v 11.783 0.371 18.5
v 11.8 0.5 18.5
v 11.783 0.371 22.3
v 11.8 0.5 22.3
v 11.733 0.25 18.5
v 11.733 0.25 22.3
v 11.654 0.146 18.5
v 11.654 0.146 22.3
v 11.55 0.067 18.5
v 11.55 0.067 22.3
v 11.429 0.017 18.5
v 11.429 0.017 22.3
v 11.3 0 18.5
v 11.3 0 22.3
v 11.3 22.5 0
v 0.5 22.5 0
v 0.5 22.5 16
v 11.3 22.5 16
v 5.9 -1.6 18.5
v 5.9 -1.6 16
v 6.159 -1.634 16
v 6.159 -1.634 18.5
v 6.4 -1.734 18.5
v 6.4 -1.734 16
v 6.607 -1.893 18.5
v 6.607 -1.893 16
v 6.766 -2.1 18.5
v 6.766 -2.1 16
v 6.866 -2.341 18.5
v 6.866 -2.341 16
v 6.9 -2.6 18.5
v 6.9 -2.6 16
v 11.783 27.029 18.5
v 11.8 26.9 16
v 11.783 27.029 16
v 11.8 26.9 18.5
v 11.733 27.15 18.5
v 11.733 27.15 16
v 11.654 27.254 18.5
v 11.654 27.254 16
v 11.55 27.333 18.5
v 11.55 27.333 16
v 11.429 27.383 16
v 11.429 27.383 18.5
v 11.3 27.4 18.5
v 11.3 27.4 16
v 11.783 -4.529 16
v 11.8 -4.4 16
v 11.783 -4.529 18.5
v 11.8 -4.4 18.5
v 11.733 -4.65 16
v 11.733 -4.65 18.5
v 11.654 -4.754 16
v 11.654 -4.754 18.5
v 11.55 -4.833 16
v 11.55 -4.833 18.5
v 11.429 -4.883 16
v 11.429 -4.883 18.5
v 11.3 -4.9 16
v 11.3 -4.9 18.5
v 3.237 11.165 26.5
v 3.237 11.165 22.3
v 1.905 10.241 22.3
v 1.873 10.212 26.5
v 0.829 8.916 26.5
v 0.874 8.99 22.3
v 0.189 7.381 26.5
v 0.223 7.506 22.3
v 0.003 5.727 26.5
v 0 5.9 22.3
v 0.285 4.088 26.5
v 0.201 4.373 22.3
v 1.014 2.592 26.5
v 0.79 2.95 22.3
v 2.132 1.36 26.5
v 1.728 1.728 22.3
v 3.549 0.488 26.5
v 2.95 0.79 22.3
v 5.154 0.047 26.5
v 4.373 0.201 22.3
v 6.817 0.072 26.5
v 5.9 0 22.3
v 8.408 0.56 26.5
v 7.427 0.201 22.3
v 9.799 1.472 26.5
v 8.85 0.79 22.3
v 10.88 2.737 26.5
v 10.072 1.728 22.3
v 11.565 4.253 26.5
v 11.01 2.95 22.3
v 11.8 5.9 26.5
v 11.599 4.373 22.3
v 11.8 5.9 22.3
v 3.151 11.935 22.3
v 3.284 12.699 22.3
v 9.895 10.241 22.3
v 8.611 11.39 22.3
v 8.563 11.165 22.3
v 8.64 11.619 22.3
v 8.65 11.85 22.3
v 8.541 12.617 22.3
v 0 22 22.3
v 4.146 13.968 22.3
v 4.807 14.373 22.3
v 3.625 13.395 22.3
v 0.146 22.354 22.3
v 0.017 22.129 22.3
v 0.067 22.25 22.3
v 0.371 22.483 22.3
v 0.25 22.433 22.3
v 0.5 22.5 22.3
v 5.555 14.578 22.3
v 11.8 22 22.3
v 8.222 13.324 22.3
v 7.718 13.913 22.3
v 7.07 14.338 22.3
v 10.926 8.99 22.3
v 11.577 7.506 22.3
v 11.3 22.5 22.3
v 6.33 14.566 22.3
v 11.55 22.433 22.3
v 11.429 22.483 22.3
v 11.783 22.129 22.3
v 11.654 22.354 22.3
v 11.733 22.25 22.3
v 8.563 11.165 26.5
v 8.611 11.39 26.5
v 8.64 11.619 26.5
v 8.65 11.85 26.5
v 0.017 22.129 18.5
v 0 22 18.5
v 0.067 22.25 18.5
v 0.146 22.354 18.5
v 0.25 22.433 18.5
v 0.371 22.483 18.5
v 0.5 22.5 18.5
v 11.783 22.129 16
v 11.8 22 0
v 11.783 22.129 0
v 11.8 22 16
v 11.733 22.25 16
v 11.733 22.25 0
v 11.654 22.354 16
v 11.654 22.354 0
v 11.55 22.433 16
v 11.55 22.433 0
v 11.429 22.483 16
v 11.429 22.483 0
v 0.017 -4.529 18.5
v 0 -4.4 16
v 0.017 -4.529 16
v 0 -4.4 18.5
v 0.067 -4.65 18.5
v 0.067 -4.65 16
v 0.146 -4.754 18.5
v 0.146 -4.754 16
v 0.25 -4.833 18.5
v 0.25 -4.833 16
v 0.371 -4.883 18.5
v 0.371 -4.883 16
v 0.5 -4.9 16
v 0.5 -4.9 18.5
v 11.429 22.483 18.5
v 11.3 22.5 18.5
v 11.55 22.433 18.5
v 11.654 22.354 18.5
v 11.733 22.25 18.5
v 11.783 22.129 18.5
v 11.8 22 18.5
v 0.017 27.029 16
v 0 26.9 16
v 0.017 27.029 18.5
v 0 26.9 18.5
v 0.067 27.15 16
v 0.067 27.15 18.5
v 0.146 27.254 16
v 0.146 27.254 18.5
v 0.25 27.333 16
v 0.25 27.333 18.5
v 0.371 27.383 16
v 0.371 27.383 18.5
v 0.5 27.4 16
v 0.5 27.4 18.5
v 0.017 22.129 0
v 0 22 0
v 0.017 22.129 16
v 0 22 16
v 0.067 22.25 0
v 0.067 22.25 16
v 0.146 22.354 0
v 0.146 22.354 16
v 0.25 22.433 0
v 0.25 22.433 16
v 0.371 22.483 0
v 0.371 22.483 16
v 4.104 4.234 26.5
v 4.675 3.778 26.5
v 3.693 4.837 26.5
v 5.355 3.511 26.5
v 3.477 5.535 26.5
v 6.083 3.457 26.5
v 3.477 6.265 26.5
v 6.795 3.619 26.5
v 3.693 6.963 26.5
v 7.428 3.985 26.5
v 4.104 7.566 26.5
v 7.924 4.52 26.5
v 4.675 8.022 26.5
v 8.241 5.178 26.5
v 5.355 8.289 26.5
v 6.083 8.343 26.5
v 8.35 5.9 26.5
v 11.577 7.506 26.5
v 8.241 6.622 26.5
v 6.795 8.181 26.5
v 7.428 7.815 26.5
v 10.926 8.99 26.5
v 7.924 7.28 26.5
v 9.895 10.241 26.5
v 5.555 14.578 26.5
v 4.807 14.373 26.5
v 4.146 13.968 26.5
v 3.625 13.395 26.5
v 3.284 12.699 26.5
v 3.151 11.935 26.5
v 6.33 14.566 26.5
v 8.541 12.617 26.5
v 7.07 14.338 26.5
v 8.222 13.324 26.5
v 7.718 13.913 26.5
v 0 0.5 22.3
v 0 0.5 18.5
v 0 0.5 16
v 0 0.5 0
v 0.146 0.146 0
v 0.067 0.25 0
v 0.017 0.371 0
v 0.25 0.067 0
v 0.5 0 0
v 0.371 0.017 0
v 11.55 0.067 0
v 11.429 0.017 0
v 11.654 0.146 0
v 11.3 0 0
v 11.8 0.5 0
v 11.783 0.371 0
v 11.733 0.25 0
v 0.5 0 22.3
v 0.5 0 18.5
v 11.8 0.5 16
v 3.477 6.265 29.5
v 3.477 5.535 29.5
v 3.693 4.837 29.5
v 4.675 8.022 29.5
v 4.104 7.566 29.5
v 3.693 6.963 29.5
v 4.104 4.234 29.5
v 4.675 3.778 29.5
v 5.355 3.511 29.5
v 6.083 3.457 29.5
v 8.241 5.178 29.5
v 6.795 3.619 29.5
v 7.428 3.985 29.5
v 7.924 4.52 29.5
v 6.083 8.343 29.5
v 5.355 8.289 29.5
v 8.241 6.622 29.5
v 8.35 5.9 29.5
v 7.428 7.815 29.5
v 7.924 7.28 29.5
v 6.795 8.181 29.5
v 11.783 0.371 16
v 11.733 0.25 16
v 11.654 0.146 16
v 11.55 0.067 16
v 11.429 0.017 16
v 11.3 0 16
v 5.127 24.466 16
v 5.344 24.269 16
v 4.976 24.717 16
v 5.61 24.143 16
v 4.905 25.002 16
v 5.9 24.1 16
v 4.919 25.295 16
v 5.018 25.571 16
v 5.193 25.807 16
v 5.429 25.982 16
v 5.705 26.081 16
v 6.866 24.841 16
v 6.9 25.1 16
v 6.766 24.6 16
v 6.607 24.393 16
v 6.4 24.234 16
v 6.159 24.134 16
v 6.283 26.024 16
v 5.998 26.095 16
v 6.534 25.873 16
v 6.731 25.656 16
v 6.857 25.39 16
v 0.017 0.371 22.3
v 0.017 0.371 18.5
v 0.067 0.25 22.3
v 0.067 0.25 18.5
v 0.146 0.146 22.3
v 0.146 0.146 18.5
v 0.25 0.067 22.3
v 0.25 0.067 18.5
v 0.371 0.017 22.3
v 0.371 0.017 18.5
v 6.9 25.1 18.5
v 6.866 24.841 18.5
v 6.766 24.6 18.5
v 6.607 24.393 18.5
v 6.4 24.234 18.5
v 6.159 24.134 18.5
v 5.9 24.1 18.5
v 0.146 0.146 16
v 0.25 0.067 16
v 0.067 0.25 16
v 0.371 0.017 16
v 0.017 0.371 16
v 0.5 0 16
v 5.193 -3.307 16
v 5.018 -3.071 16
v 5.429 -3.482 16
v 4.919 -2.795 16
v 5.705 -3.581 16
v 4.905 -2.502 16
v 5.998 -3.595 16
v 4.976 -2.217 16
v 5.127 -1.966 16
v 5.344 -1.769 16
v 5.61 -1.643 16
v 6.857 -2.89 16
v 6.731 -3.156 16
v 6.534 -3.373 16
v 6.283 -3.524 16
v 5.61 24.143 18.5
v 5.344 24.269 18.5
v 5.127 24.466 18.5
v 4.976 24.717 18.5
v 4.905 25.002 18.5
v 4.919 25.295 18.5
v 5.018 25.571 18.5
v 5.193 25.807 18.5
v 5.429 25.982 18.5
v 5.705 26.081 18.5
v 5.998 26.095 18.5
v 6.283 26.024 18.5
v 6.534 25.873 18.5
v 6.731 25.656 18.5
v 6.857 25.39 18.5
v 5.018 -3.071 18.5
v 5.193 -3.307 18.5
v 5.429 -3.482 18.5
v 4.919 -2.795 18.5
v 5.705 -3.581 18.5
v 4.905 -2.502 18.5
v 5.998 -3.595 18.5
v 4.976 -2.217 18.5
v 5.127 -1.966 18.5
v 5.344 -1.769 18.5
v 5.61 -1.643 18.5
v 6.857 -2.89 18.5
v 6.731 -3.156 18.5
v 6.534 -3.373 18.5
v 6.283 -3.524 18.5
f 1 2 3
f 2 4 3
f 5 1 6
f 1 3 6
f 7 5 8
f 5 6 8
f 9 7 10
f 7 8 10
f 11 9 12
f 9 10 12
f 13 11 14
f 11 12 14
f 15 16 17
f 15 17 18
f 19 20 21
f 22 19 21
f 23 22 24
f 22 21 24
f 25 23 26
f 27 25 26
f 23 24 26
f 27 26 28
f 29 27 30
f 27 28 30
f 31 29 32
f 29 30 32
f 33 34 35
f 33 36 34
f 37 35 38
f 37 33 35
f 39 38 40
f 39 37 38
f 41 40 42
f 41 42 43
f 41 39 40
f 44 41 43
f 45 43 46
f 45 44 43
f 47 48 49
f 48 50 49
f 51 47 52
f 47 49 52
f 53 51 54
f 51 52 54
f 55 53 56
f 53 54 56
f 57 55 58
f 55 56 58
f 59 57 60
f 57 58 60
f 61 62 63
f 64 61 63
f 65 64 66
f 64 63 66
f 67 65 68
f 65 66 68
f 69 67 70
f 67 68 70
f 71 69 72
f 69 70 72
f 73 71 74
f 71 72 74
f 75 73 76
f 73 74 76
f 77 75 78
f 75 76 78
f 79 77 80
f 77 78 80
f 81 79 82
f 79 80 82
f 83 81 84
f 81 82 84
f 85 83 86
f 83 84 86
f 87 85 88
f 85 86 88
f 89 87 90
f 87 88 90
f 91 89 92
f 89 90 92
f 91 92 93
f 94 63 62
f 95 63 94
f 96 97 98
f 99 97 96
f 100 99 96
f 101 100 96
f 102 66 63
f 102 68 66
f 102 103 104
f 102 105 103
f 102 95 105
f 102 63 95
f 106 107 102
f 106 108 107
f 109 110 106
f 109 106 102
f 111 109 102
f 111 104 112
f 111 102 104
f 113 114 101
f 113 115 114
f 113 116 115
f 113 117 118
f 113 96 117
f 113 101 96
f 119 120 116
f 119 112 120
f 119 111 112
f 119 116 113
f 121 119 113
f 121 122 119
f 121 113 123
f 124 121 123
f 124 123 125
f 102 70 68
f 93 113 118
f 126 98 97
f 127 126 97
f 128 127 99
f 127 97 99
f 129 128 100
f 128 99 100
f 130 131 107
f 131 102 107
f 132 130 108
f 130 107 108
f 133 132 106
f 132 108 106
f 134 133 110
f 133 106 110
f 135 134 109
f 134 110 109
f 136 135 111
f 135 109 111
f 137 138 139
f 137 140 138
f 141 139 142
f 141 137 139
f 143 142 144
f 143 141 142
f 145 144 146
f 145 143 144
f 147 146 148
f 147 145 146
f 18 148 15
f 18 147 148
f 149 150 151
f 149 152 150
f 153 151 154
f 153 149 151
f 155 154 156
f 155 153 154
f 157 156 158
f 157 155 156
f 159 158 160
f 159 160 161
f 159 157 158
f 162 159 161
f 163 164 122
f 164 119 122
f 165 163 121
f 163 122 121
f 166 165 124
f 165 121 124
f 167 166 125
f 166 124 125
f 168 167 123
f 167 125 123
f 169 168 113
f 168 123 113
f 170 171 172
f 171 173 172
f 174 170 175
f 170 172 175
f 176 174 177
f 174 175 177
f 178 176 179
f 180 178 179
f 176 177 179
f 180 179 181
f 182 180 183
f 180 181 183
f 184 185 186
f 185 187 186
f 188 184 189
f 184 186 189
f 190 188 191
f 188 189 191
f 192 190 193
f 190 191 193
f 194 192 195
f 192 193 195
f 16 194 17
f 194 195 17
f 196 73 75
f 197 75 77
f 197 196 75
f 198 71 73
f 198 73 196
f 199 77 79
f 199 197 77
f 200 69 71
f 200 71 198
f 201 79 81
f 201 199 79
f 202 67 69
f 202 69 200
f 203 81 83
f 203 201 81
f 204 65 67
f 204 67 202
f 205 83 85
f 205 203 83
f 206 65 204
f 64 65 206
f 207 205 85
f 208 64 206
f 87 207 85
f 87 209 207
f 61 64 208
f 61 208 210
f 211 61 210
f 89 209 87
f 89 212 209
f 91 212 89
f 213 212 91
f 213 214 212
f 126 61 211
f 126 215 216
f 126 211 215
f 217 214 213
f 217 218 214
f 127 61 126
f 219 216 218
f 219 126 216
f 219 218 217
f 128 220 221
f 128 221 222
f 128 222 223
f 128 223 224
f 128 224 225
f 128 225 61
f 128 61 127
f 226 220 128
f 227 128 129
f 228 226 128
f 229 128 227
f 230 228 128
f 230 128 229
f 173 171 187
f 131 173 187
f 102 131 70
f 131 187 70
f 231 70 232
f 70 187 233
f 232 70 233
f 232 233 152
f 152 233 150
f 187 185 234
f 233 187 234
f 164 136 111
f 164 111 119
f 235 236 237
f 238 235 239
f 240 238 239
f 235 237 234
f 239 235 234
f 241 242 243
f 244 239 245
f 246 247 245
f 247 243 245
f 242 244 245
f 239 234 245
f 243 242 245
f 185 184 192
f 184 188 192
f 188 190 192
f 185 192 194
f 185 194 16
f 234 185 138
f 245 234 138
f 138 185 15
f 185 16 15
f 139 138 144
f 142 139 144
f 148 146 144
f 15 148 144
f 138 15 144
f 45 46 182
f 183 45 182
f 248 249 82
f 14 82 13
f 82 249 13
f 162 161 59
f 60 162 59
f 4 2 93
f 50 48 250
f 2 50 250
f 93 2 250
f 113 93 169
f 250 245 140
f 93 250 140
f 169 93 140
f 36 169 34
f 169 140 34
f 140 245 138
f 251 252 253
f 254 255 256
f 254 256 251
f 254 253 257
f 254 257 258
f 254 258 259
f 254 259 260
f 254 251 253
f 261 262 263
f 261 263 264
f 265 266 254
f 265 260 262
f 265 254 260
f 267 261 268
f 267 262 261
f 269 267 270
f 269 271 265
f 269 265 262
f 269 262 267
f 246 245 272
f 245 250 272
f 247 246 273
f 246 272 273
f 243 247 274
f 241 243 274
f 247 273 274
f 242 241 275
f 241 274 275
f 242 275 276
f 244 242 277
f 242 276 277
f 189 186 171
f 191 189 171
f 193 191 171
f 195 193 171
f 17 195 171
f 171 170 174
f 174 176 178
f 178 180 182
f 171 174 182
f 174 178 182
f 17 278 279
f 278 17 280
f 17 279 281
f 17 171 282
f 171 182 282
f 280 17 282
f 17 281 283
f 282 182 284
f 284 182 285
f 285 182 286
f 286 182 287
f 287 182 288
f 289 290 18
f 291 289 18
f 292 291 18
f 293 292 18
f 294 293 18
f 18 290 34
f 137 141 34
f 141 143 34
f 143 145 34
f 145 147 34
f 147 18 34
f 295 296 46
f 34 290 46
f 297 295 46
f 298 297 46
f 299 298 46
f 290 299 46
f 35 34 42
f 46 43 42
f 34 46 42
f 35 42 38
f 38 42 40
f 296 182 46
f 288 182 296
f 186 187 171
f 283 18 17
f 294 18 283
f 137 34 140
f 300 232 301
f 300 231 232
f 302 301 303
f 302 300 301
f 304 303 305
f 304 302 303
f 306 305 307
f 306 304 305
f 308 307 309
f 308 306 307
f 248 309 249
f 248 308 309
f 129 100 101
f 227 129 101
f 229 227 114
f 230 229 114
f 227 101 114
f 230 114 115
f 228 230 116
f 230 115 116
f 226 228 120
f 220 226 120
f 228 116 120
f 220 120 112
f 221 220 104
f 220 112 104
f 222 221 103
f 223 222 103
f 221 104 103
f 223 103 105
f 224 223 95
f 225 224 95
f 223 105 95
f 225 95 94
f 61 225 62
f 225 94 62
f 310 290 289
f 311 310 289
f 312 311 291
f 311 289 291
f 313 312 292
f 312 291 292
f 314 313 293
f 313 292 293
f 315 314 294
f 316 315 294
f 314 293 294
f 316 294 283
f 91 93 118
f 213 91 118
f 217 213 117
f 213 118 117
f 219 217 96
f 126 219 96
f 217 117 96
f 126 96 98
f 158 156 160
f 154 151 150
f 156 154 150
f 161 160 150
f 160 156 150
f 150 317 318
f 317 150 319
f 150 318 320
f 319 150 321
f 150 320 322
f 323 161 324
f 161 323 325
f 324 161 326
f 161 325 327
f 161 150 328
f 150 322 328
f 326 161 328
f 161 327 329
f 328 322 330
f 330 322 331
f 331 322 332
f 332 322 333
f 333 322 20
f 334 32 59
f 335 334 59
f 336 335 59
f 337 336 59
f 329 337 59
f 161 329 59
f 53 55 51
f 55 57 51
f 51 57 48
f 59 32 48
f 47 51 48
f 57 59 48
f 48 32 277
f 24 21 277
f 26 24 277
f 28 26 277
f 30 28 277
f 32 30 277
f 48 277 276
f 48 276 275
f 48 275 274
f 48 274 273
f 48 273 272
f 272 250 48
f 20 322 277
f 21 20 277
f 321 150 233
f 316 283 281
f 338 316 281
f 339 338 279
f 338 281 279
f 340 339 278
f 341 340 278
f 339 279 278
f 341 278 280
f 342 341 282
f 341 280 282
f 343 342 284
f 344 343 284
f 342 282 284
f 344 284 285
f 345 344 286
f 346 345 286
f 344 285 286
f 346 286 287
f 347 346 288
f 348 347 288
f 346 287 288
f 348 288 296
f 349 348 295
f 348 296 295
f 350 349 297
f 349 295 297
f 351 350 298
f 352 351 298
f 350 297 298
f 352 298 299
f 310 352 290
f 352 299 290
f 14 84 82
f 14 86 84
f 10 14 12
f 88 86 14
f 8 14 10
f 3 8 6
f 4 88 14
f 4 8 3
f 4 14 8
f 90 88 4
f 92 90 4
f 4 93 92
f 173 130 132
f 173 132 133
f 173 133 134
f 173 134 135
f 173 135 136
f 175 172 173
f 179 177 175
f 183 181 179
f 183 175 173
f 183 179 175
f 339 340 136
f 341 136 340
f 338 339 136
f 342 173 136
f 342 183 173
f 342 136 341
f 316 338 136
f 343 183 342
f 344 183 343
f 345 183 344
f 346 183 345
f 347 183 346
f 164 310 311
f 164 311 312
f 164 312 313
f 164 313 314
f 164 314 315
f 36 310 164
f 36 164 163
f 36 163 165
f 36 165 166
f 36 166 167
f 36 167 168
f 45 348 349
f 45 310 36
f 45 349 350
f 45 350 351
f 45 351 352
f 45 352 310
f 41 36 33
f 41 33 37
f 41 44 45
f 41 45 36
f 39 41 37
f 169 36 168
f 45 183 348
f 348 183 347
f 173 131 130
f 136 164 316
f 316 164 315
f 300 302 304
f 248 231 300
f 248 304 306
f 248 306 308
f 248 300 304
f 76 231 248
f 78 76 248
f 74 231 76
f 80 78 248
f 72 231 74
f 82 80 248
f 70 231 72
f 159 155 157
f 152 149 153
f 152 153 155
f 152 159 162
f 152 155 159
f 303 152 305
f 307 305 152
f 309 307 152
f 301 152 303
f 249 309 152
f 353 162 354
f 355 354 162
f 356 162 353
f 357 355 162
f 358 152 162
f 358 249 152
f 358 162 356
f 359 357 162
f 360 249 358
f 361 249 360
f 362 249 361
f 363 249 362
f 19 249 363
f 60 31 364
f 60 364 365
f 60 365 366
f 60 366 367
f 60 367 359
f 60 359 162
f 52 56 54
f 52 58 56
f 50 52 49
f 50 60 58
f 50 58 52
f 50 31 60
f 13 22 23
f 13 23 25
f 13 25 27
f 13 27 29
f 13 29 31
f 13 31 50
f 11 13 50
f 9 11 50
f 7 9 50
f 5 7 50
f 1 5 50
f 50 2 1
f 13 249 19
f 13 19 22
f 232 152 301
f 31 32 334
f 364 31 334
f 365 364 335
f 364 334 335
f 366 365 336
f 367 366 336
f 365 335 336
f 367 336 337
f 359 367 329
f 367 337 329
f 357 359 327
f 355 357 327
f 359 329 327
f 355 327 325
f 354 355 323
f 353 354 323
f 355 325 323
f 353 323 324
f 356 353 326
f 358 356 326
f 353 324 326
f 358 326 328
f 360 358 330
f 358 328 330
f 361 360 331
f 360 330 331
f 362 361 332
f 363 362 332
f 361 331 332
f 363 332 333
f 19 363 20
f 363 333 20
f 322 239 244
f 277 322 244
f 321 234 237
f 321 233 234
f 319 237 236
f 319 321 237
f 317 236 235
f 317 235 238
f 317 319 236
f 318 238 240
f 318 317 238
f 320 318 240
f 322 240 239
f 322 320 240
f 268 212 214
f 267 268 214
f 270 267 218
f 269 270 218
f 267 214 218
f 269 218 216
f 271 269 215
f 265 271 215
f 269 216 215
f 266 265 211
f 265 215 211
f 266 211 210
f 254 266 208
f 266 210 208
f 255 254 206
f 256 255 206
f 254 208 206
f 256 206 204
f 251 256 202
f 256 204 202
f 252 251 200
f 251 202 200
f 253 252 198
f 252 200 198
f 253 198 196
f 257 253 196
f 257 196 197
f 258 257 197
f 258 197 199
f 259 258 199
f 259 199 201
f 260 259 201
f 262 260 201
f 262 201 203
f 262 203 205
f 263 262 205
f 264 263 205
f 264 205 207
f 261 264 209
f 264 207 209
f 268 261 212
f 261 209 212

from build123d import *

# Parameters (mm, degrees)
F0_W     = 11.8
F0_H     = 22.5
F1_DEPTH = 22.3
F4_DEPTH = 2.5
F6_DEPTH = 4.2
F7_R     = 2.45
F8_DEPTH = 3
F9_R     = 0.5


with BuildPart() as f1:
    # F0 (on Top) → F1 (new body)
    with BuildSketch(Plane.XY):
        with Locations((5.9, 11.25)):
            Rectangle(F0_W, F0_H)
    extrude(amount=F1_DEPTH)

    # F3 (on offset) → F4 (join)
    with BuildSketch(Plane.XY.offset(16)):
        Polygon((11.8, 27.4), (0, 27.4), (0, 11.25), (0, -4.9), (11.8, -4.9), align=None)
        with BuildLine():
            ThreePointArc((6.9, -2.6), (5.1928932188, -3.3071067812), (5.9, -1.6))
            ThreePointArc((5.9, -1.6), (6.6071067812, -1.8928932188), (6.9, -2.6))
        make_face(mode=Mode.SUBTRACT)
        with BuildLine():
            ThreePointArc((6.9, 25.1), (6.6071067812, 24.3928932188), (5.9, 24.1))
            ThreePointArc((5.9, 24.1), (5.1928932188, 25.8071067812), (6.9, 25.1))
        make_face(mode=Mode.SUBTRACT)
    extrude(amount=F4_DEPTH)

    # F5 (on face) → F6 (join)
    with BuildSketch(Plane.XY.offset(22.3)):
        with BuildLine():
            ThreePointArc((3.2367553675, 11.1647058824), (2.8099468719, 0.8739108976), (11.8, 5.9))
            ThreePointArc((11.8, 5.9), (10.9260891024, 8.9900531281), (8.5632446325, 11.1647058824))
            ThreePointArc((8.5632446325, 11.1647058824), (5.9, 9.1), (3.2367553675, 11.1647058824))
        make_face()
        with BuildLine():
            ThreePointArc((3.2367553675, 11.1647058824), (5.9, 9.1), (8.5632446325, 11.1647058824))
            ThreePointArc((8.5632446325, 11.1647058824), (5.9, 11.8), (3.2367553675, 11.1647058824))
        make_face()
        with BuildLine():
            ThreePointArc((3.2367553675, 11.1647058824), (5.9, 11.8), (8.5632446325, 11.1647058824))
            ThreePointArc((8.5632446325, 11.1647058824), (8.6282249485, 11.5046181383), (8.65, 11.85))
            ThreePointArc((8.65, 11.85), (5.5546181383, 14.5782249485), (3.2367553675, 11.1647058824))
        make_face()
    extrude(amount=F6_DEPTH)

    # F7 (on face) → F8 (join)
    with BuildSketch(Plane.XY.offset(26.5)):
        with Locations((5.9, 5.9)):
            Circle(F7_R)
    extrude(amount=F8_DEPTH)

    # F9
    f9_edges = [f1.edges().sort_by_distance(p)[0] for p in [
        (11.8, 0, 8),
        (11.8, 0, 20.4),
        (0, 0, 8),
        (0, 0, 20.4),
        (0, 22.5, 20.4),
        (0, 22.5, 8),
        (11.8, 22.5, 8),
        (11.8, 22.5, 20.4),
        (0, -4.9, 17.25),
        (11.8, -4.9, 17.25),
        (11.8, 27.4, 17.25),
        (0, 27.4, 17.25),
    ]]
    fillet(f9_edges, radius=F9_R)


solid = f1.part
